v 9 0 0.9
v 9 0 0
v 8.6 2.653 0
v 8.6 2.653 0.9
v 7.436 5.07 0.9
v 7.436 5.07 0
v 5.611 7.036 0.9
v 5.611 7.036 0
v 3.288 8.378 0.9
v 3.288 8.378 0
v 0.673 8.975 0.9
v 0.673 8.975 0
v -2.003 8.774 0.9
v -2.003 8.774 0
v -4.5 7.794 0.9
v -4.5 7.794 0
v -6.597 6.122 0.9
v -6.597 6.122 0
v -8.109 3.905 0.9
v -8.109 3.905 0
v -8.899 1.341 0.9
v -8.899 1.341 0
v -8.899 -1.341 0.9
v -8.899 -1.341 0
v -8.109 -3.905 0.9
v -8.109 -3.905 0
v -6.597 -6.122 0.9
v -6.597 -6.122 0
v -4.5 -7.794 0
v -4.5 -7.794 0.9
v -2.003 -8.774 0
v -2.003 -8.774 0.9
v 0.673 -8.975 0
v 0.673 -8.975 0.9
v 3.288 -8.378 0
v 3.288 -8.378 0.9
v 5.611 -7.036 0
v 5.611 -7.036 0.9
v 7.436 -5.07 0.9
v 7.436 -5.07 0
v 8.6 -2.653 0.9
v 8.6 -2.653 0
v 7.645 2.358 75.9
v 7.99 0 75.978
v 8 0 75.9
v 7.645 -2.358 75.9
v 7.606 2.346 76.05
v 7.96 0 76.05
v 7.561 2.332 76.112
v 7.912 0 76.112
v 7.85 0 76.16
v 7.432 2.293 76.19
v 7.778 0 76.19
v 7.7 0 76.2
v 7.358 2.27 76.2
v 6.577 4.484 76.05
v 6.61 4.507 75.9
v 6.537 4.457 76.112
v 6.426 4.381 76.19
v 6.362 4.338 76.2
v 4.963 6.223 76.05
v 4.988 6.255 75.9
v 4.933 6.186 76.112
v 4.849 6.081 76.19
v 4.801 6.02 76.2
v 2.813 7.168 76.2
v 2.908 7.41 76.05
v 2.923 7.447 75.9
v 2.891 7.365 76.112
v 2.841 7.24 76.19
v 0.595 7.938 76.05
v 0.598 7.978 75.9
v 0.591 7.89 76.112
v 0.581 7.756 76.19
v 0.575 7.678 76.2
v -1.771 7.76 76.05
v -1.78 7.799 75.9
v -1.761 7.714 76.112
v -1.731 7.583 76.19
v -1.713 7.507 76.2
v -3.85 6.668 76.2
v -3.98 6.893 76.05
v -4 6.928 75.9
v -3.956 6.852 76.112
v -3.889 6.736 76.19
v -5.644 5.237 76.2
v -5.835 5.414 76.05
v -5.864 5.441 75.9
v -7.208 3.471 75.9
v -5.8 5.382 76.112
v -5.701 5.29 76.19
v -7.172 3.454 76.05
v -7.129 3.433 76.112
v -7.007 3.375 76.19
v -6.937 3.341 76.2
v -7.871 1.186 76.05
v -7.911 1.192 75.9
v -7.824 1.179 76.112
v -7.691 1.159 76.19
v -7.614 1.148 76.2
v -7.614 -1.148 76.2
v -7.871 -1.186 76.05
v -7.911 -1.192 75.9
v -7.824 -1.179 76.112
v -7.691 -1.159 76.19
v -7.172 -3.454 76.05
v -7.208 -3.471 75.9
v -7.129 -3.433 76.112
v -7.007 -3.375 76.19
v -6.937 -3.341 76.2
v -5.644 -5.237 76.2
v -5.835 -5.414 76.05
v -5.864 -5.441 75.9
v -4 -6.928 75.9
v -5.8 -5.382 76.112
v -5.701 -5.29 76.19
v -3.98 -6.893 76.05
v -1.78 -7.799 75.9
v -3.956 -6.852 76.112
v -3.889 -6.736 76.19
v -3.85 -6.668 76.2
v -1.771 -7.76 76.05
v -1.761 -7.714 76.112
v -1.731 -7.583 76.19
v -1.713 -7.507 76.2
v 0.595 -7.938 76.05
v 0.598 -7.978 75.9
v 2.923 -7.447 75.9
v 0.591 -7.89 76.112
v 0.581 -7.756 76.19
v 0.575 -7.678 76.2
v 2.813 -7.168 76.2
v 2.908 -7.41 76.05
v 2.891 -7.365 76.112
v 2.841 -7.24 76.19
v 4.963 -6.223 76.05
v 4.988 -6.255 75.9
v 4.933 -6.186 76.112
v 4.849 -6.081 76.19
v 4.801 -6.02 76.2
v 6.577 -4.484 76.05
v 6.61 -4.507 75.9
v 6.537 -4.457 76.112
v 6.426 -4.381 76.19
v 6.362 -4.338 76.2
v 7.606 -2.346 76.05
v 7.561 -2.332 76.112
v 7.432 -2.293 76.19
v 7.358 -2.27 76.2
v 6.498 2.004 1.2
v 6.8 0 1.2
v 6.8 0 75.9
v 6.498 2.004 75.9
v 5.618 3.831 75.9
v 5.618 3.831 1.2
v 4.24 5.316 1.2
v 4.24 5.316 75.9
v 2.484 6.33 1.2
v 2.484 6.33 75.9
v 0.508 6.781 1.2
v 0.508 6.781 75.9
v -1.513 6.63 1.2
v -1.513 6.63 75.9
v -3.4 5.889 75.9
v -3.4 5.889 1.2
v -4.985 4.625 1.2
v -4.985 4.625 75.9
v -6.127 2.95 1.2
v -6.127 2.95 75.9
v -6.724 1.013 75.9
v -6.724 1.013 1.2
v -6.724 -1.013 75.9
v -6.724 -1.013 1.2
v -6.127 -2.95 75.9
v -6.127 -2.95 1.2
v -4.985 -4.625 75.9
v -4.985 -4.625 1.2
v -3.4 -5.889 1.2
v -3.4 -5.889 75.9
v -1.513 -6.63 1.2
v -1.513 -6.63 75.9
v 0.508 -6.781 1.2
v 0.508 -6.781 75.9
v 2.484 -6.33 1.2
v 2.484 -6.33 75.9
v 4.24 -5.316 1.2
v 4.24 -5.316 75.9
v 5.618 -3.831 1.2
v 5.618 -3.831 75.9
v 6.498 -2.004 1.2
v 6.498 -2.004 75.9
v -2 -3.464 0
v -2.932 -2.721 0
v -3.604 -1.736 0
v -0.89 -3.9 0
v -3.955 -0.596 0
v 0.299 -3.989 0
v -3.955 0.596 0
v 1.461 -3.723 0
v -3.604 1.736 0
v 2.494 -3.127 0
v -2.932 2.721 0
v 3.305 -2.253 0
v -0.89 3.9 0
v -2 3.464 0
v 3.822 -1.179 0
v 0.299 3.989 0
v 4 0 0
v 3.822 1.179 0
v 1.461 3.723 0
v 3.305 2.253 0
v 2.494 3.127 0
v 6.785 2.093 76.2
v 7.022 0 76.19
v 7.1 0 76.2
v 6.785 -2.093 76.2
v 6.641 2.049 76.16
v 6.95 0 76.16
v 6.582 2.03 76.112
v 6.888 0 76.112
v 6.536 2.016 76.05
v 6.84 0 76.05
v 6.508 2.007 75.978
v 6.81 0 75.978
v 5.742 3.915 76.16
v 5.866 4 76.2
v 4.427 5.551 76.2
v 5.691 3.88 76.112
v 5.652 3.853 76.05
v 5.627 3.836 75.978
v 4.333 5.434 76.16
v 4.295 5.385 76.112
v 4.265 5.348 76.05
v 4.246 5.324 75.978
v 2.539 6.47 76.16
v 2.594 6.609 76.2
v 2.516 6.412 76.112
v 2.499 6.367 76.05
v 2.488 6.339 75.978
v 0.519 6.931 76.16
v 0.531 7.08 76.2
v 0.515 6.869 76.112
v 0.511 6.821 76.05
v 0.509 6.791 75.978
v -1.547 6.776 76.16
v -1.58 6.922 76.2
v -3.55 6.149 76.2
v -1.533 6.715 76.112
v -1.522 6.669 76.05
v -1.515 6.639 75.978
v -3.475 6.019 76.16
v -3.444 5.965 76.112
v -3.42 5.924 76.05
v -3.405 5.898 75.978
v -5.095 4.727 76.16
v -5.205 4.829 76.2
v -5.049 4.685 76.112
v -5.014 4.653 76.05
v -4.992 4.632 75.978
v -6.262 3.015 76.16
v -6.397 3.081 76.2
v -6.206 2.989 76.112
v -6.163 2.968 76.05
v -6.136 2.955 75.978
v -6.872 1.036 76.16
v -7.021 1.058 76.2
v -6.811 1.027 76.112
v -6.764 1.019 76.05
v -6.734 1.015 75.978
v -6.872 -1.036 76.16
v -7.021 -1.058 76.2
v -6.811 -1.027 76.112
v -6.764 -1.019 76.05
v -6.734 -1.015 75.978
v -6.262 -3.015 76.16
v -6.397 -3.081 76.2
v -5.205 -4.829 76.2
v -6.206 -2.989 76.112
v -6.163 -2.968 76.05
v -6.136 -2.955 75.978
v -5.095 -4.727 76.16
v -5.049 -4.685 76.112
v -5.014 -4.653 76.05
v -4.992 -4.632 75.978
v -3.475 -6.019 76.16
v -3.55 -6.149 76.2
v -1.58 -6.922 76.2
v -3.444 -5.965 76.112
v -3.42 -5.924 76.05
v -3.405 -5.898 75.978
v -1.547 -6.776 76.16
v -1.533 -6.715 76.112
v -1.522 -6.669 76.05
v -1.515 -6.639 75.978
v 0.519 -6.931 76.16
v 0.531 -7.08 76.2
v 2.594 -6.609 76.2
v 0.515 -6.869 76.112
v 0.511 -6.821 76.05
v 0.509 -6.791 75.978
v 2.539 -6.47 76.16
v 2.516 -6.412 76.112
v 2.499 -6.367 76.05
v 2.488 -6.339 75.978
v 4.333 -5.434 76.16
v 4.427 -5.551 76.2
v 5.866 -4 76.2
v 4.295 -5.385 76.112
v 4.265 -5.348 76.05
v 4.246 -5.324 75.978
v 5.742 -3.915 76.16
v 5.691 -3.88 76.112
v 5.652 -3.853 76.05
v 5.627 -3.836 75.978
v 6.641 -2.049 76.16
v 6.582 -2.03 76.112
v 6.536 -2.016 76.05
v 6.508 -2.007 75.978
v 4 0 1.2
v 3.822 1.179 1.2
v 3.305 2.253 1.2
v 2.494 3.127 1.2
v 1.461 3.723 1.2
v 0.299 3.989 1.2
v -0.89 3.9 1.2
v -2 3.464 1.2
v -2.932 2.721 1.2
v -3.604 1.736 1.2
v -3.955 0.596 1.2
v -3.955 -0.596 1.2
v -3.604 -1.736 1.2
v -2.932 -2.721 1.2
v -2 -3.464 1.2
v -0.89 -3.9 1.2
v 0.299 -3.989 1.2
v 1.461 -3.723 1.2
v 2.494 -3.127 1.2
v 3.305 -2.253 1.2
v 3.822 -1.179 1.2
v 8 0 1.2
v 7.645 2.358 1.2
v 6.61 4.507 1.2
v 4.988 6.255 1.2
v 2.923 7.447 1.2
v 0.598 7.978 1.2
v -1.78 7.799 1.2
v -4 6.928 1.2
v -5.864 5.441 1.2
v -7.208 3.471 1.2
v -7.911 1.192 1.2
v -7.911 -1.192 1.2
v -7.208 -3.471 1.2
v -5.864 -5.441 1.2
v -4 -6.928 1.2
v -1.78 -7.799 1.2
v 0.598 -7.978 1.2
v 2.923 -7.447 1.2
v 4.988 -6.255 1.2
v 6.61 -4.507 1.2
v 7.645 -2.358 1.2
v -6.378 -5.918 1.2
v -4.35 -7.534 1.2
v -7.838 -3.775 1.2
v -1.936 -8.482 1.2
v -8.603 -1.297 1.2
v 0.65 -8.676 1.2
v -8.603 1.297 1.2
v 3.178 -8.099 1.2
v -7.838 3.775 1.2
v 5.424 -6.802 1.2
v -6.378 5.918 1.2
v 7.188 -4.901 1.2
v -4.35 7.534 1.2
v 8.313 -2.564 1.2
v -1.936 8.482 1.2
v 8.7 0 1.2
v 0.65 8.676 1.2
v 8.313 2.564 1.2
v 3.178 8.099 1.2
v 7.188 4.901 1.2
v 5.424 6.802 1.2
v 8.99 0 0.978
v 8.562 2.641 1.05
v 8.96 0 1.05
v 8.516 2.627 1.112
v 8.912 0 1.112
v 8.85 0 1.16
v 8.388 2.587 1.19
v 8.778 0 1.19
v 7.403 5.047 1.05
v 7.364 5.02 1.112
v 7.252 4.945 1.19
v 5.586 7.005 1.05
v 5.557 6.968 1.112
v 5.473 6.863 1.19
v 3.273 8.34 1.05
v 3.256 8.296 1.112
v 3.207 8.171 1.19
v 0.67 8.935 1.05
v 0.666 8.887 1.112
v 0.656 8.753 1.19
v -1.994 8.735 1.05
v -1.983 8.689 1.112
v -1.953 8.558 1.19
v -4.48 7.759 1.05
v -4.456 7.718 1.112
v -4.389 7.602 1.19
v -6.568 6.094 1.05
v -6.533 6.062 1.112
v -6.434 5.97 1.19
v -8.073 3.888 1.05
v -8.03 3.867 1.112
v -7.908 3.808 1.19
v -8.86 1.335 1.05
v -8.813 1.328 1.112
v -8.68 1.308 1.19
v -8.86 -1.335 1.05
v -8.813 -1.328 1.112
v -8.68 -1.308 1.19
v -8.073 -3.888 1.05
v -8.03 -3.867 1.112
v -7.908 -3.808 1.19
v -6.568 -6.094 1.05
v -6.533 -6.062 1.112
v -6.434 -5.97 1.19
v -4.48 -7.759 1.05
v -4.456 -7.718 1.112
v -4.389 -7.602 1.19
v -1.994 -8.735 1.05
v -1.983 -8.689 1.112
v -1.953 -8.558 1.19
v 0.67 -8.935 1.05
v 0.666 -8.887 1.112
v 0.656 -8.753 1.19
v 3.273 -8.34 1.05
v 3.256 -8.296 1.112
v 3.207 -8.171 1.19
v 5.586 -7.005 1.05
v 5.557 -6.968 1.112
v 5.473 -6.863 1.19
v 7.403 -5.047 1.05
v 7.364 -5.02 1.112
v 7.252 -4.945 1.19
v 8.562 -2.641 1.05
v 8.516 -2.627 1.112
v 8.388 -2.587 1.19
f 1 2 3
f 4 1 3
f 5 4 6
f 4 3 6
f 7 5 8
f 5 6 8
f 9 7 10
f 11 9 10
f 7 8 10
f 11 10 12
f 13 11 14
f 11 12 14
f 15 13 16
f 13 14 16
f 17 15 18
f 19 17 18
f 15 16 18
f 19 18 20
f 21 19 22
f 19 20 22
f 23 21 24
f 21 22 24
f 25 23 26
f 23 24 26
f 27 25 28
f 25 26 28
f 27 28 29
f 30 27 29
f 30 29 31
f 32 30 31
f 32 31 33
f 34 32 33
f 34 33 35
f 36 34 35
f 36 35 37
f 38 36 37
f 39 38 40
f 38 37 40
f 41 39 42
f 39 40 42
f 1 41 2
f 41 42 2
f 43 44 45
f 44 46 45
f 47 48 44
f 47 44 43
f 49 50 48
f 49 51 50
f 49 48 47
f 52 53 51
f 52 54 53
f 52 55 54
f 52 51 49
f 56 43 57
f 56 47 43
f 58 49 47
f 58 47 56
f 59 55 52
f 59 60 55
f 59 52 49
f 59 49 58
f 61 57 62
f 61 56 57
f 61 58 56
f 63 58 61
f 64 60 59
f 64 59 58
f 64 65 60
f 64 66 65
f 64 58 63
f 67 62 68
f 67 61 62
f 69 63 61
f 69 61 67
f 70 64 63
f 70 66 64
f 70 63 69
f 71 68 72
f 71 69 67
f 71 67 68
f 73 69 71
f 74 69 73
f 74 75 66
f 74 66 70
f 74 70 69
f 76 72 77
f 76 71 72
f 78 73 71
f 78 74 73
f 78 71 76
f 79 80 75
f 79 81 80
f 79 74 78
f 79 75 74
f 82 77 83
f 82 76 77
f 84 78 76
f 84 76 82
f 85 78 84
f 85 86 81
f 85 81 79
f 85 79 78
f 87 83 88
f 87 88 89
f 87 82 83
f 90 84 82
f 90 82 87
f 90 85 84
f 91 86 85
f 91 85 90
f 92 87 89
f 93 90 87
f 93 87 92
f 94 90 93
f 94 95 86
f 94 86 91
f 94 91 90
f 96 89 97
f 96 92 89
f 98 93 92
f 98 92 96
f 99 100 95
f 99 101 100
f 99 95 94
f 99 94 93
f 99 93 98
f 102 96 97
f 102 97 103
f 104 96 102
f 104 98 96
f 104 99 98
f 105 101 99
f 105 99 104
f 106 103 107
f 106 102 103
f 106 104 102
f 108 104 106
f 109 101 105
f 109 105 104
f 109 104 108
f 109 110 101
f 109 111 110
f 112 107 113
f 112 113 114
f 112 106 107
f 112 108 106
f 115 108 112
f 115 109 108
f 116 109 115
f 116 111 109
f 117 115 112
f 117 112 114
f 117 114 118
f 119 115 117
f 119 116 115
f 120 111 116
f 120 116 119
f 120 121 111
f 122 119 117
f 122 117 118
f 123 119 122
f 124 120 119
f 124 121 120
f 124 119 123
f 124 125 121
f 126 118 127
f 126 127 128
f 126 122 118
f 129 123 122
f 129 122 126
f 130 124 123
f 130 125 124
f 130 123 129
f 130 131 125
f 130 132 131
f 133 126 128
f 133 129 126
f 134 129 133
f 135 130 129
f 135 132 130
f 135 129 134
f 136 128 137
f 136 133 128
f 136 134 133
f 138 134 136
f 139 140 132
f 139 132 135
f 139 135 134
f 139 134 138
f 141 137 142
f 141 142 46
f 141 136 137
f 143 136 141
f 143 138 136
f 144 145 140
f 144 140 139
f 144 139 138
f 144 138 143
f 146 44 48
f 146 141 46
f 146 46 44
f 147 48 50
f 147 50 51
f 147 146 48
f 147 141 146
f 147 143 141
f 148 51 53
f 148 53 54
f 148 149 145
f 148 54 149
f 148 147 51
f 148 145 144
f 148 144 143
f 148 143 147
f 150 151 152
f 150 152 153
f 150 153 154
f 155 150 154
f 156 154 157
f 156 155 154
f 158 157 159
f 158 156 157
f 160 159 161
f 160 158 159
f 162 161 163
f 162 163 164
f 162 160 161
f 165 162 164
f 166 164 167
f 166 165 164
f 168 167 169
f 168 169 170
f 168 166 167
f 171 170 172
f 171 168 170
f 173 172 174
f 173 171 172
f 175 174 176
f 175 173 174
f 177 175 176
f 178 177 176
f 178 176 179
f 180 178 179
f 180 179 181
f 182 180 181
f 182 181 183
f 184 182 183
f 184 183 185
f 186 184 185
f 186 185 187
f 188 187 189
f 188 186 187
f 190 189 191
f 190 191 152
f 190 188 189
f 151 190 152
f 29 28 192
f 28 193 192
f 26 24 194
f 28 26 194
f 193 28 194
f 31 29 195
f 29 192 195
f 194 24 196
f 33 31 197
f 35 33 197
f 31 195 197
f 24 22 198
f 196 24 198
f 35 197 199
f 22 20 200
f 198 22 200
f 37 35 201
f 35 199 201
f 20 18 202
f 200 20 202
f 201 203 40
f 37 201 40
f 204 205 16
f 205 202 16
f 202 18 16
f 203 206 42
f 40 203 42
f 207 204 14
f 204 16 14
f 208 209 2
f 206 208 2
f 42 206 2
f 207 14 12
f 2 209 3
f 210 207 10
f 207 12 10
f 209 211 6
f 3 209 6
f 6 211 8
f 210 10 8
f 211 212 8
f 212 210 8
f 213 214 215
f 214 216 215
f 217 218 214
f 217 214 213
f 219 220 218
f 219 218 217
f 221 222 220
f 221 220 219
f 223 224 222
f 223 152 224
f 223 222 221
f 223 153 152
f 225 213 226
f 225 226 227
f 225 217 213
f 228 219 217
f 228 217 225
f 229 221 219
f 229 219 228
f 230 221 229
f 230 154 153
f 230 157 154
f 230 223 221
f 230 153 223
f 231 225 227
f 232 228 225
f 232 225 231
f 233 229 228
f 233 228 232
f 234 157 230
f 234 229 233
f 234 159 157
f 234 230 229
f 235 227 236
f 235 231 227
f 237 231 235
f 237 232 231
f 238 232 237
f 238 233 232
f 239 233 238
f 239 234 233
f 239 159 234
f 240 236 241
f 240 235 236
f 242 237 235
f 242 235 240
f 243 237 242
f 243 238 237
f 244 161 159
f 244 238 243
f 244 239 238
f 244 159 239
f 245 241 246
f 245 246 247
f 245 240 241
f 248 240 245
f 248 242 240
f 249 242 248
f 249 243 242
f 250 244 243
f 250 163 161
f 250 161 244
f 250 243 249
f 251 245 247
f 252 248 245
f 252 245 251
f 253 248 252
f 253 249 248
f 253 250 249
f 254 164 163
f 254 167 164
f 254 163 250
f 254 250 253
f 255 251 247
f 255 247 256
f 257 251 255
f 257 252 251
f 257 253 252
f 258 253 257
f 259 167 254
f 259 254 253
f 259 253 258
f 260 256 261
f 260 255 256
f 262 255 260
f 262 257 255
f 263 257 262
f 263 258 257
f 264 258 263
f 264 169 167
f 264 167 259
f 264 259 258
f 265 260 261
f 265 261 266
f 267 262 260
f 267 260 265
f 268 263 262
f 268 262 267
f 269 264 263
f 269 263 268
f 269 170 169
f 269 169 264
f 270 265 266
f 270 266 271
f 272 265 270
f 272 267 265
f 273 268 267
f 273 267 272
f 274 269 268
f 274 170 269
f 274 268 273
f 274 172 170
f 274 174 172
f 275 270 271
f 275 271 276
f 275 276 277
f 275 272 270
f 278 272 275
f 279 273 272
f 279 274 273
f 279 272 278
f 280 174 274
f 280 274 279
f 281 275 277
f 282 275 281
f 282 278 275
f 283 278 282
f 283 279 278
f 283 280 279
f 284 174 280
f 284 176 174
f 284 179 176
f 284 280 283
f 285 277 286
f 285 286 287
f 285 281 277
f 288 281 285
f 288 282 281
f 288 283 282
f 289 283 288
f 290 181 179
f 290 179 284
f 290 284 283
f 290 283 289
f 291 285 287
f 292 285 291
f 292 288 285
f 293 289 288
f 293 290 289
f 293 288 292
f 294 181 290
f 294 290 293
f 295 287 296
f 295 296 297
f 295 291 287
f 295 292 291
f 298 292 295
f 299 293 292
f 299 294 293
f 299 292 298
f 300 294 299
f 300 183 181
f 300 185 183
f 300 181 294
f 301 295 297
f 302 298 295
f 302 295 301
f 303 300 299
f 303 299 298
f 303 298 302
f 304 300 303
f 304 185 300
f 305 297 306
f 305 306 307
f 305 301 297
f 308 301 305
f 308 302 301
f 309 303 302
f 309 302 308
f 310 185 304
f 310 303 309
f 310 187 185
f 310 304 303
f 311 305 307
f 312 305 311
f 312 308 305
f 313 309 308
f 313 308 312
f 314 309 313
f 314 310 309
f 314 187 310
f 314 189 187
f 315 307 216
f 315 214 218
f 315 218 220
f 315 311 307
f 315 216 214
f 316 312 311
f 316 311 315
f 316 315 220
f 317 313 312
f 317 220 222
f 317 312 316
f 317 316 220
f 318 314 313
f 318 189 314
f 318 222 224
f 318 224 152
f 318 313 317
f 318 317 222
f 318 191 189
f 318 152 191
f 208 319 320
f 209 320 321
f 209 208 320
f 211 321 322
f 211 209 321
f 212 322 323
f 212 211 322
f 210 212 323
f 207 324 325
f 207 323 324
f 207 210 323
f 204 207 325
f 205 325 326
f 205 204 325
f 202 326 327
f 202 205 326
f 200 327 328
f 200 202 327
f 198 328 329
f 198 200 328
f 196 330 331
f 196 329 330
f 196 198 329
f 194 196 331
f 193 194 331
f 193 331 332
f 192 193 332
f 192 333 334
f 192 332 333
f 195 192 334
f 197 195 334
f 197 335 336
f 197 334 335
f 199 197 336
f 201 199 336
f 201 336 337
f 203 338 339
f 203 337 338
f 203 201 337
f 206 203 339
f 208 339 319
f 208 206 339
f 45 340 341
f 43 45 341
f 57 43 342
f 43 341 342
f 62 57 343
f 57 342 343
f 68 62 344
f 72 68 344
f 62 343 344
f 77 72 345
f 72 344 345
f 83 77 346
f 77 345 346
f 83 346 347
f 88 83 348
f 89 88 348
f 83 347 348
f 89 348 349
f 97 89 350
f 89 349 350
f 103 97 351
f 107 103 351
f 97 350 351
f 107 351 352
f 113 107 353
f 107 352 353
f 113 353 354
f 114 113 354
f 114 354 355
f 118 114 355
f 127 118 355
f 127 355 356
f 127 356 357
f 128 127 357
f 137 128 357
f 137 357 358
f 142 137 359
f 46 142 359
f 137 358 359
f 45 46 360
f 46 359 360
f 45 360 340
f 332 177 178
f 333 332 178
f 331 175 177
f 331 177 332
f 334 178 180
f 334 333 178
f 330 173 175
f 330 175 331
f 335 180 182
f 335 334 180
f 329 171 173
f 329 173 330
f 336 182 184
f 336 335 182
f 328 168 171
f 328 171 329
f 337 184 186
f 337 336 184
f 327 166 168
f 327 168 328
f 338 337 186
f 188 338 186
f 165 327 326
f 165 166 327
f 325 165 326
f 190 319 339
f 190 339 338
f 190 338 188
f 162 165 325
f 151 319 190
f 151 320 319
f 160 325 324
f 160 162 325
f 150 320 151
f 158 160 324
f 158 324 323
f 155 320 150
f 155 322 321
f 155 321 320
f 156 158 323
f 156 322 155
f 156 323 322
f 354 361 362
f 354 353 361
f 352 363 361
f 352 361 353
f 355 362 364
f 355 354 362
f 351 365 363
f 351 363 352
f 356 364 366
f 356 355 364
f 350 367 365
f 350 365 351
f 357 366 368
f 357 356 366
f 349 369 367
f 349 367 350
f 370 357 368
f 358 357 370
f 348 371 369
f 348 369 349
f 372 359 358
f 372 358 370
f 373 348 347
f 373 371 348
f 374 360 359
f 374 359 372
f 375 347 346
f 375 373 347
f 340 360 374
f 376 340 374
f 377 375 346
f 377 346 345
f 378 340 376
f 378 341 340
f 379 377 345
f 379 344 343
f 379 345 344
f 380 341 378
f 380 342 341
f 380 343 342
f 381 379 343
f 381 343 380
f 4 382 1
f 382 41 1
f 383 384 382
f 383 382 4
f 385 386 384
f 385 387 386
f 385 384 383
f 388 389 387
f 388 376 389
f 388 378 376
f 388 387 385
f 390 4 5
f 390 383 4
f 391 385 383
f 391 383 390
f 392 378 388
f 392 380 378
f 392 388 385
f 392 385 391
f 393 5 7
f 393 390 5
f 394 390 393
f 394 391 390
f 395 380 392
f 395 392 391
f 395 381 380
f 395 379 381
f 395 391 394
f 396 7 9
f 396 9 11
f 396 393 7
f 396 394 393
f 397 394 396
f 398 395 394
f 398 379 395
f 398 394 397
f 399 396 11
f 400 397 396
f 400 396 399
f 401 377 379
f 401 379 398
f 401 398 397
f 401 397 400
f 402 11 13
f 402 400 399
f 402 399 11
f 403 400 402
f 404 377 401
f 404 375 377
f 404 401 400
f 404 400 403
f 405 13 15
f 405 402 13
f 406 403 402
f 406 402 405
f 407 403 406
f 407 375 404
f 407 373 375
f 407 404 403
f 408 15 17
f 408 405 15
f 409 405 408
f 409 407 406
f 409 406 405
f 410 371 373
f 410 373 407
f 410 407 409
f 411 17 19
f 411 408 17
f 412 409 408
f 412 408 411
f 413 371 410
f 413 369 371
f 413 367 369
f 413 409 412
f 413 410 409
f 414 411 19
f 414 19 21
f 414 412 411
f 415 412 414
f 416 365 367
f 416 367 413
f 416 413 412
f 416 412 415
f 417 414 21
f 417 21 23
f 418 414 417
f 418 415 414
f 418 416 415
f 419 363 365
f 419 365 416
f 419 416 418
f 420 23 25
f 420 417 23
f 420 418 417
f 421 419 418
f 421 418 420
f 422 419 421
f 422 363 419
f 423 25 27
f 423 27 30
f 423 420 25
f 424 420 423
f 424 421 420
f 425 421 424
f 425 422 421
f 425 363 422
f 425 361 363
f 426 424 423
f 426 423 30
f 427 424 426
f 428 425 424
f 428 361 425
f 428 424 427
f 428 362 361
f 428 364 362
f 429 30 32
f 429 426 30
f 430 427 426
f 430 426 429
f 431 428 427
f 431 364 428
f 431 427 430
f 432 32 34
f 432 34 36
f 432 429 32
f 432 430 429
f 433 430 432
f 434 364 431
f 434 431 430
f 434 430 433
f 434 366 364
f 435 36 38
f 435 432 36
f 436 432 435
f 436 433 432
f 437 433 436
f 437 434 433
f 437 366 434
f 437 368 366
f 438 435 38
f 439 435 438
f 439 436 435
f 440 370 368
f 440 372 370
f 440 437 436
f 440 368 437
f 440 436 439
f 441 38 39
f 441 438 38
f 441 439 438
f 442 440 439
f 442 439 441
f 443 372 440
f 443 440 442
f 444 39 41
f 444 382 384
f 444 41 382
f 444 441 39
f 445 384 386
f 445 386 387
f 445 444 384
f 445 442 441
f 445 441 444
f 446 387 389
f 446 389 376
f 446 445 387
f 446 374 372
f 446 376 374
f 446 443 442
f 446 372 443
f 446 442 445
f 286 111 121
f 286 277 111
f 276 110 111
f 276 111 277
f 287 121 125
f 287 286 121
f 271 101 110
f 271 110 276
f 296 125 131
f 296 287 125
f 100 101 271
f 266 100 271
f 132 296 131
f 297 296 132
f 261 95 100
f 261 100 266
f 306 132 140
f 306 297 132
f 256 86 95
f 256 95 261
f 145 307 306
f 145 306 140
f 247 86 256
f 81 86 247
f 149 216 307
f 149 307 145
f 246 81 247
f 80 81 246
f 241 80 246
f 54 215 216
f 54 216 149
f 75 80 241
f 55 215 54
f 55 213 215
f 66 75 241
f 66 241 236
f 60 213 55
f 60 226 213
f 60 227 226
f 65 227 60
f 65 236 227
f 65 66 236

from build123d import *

# Parameters (mm, degrees)
CYLINDER_R        = 9
CYLINDER_DEPTH    = 1.2
CYLINDER001_R     = 8
CYLINDER001_DEPTH = 75
CYLINDER002_R     = 4
CYLINDER002_DEPTH = 76.2
CYLINDER003_R     = 6.8
CYLINDER003_DEPTH = 75
FILLET_R          = 0.3


with BuildPart() as part:
    # Cylinder → Cylinder (join)
    with BuildSketch(Plane.XY):
        Circle(CYLINDER_R)
    extrude(amount=CYLINDER_DEPTH)

    # Cylinder001 → Cylinder001 (join)
    with BuildSketch(Plane.XY.offset(1.2)):
        Circle(CYLINDER001_R)
    extrude(amount=CYLINDER001_DEPTH)

    # Cylinder002 → Cylinder002 (cut)
    with BuildSketch(Plane.XY):
        Circle(CYLINDER002_R)
    extrude(amount=CYLINDER002_DEPTH, mode=Mode.SUBTRACT)

    # Cylinder003 → Cylinder003 (cut)
    with BuildSketch(Plane.XY.offset(1.2)):
        Circle(CYLINDER003_R)
    extrude(amount=CYLINDER003_DEPTH, mode=Mode.SUBTRACT)

    # Fillet
    fillet_edges = [part.edges().sort_by_distance(p)[0] for p in [
        (-9, 0, 1.2),
        (-8, 0, 76.2),
        (-6.8, 0, 76.2),
    ]]
    fillet(fillet_edges, radius=FILLET_R)


solid = part.part
